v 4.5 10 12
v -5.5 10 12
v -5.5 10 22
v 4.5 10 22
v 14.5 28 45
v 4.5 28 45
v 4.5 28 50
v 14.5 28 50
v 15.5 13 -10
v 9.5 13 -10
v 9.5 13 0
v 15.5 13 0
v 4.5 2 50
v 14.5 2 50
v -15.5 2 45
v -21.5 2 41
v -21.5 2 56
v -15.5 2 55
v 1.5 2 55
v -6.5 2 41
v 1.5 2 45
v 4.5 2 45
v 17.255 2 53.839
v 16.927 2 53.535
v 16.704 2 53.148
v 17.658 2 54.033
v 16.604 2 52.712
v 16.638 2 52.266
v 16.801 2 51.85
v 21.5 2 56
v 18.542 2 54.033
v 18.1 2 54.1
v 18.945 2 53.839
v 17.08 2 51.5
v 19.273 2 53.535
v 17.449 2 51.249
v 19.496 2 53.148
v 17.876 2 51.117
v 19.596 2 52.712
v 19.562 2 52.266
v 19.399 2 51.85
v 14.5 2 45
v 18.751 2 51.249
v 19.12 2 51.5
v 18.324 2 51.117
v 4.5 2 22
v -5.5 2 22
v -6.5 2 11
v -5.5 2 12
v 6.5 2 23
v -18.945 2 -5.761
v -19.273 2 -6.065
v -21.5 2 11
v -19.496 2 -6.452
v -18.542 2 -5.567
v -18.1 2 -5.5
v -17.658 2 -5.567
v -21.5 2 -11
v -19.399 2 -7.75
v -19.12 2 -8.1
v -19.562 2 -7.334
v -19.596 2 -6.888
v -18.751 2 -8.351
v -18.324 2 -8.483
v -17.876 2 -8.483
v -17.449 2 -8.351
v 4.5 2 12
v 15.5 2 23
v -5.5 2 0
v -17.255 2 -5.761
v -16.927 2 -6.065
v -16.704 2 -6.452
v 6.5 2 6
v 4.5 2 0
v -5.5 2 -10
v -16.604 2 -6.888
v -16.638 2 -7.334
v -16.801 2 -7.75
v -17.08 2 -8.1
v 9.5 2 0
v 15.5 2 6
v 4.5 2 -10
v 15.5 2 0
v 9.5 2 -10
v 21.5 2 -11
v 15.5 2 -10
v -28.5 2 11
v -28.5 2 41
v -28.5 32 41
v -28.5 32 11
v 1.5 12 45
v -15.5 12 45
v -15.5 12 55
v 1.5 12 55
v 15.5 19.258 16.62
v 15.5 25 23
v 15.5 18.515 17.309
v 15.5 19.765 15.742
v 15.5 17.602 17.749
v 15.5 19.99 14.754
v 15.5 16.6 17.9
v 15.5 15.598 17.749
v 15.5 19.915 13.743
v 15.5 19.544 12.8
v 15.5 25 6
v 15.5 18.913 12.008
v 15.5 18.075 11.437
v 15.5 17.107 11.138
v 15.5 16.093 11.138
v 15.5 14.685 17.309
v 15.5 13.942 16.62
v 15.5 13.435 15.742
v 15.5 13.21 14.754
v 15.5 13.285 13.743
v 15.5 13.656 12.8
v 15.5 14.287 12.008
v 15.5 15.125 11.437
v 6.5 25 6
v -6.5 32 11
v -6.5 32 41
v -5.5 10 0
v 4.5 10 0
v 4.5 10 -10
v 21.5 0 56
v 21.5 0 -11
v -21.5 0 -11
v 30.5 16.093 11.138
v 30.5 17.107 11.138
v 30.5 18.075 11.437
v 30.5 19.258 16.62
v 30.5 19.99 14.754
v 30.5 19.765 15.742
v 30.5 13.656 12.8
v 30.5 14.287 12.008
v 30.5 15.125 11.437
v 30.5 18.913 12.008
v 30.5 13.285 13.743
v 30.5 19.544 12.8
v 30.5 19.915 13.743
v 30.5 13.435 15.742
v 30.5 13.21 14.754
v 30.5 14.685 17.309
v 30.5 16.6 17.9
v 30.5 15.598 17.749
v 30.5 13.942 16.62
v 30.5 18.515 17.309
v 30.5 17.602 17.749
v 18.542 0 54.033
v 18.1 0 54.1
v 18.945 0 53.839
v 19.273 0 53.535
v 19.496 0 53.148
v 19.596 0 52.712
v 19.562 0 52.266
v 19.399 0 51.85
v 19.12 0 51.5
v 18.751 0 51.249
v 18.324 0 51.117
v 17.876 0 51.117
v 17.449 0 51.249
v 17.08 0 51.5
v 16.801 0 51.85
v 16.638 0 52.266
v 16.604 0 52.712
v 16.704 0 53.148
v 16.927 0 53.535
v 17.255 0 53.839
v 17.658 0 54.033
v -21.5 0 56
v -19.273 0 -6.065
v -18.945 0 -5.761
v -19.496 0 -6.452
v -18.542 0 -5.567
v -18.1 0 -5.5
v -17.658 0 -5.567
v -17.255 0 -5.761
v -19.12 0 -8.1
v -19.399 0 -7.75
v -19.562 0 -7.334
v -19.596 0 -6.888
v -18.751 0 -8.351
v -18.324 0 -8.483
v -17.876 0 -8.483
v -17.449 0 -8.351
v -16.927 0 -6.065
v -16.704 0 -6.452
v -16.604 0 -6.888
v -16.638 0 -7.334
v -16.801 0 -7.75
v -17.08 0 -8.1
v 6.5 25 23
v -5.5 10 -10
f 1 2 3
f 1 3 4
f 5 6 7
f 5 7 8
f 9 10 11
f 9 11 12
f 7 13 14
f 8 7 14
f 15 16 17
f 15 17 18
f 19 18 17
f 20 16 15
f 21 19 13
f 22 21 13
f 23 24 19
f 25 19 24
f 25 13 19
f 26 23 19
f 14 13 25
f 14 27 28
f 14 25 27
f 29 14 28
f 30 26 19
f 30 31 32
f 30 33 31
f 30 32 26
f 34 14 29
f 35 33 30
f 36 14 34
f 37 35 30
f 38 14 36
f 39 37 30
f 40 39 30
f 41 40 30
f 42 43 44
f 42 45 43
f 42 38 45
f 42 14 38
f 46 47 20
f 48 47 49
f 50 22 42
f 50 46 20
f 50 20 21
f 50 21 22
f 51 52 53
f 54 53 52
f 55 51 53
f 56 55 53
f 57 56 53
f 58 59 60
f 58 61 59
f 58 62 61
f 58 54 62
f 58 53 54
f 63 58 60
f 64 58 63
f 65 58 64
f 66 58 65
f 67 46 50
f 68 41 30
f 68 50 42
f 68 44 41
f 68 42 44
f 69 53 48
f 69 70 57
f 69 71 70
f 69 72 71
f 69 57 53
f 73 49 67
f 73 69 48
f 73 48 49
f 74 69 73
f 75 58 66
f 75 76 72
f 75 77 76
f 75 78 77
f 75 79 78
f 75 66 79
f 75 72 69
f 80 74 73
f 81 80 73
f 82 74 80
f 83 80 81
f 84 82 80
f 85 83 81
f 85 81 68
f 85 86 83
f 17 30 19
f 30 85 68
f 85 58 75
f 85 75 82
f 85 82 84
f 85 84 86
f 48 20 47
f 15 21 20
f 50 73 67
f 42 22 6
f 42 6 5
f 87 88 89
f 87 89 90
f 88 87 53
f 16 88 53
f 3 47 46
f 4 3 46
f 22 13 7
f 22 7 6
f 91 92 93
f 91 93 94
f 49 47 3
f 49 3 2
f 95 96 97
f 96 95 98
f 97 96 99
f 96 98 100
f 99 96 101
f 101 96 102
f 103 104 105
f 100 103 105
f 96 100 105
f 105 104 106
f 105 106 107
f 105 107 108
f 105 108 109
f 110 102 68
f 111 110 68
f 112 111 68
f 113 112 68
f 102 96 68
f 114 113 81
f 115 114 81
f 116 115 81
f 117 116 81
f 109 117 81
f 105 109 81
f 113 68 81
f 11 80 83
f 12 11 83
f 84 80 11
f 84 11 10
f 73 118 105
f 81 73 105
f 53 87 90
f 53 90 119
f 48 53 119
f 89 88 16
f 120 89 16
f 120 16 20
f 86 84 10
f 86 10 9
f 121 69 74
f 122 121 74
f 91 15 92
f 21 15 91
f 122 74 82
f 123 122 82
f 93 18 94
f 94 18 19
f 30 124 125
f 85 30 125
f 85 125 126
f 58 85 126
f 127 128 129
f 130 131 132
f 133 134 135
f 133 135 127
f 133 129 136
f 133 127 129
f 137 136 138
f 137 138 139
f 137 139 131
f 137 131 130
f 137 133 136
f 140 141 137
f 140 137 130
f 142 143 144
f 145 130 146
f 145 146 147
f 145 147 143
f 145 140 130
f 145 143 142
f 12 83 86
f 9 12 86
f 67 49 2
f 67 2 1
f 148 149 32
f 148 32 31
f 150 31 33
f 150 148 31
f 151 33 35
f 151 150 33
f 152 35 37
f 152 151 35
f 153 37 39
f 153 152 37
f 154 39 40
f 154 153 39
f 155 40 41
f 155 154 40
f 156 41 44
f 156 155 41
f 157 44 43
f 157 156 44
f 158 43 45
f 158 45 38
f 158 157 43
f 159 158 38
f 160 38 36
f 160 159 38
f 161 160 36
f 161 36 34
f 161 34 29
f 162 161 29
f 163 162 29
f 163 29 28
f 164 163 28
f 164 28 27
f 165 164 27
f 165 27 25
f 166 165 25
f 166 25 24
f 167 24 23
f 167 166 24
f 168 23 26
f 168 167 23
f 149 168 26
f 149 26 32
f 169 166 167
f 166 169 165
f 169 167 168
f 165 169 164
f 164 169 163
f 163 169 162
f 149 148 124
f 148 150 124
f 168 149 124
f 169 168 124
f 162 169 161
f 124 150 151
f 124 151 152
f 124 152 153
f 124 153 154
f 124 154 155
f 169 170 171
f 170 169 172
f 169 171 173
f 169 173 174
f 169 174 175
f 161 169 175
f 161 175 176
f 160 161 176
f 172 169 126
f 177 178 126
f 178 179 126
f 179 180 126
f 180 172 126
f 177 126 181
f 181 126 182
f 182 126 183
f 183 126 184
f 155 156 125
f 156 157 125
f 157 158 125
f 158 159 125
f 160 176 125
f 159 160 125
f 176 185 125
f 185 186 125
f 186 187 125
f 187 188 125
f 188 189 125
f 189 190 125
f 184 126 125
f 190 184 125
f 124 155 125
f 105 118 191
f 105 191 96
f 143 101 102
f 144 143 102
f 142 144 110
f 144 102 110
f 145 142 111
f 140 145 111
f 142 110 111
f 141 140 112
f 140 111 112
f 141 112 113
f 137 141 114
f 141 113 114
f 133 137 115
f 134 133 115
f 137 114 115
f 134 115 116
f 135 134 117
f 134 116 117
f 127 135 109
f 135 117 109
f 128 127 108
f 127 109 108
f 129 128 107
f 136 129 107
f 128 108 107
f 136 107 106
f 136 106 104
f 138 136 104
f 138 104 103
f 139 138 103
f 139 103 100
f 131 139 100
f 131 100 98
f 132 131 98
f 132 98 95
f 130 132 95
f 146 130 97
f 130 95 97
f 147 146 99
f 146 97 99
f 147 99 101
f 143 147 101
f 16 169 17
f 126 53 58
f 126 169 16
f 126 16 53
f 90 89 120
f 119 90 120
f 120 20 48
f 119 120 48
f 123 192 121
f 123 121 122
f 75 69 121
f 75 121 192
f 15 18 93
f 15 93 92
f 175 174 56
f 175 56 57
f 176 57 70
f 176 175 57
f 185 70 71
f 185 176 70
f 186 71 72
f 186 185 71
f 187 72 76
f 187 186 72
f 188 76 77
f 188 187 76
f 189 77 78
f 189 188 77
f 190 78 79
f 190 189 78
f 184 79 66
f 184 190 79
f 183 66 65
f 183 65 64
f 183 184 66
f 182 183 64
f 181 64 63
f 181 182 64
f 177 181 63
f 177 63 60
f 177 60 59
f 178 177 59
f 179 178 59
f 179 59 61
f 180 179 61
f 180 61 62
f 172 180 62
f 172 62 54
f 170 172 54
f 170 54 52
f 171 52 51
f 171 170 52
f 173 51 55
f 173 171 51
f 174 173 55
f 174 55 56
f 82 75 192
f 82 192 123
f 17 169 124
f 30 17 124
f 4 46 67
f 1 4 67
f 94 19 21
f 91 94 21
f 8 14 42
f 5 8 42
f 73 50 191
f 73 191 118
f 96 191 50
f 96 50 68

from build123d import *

# Parameters (mm, degrees)
SKETCH1_W              = 43
SKETCH1_H              = 112
SKETCH1_R              = 1.5
BOARD_DEPTH            = 2
SKETCH2_W              = 16
SKETCH2_H              = 40
SKETCH2_W_2            = 6
SKETCH2_H_2            = 10
F_7SEG_DEPTH           = 11
SKETCH3_W              = 10
SKETCH3_H              = 20
SKETCH3_H_2            = 10
IC_DEPTH               = 8
SKETCH5_W              = 9
SKETCH5_H              = 17
BIENTROA_DEPTH         = 23
SKETCH6_R              = 3.4
BIENTROB_DEPTH         = 15
SKETCH7_W              = 10
SKETCH7_H              = 5
IRF540_DEPTH           = 26
SKETCH8_W              = 17
SKETCH8_H              = 10
DOMINO_DEPTH           = 10
SKETCH9_W              = 22
SKETCH9_H              = 30
EXTRUDE_7805_DEPTH     = 30
SPLIT2_SURFACE_1_BACK  = 131.572
SPLIT2_SURFACE_1_DEPTH = 263.144
SPLIT2_SURFACE_2_BACK  = 131.572
SPLIT2_SURFACE_2_DEPTH = 263.144


with BuildPart() as part:
    # Sketch1 → Board (new body)
    with BuildSketch(Plane(origin=(0, 0, 0), x_dir=(1, 0, 0), z_dir=(0, 1, 0))):
        Rectangle(SKETCH1_W, SKETCH1_H)
        with Locations(Location((18.1, -52.6, 0), (0, 0, 270))):
            Circle(SKETCH1_R, mode=Mode.SUBTRACT)
        with Locations(Location((-16.5, 52, 0), (0, 0, 270))):
            Circle(SKETCH1_R, mode=Mode.SUBTRACT)
        with Locations(Location((-18.1, 7, 0), (0, 0, 270))):
            Circle(SKETCH1_R, mode=Mode.SUBTRACT)
    extrude(amount=BOARD_DEPTH)

    # Sketch2 → 7SEG (add)
    with BuildSketch(Plane(origin=(0, 2, 0), x_dir=(1, 0, 0), z_dir=(0, 1, 0))):
        with Locations((8.5, 31)):
            Rectangle(SKETCH2_W, SKETCH2_H)
        with Locations((12.5, 5)):
            Rectangle(SKETCH2_W_2, SKETCH2_H_2)
    extrude(amount=F_7SEG_DEPTH)

    # Sketch3 → IC (add)
    with BuildSketch(Plane(origin=(0, 2, 0), x_dir=(1, 0, 0), z_dir=(0, 1, 0))):
        with Locations((-6.5, 26)):
            Rectangle(SKETCH3_W, SKETCH3_H)
        with Locations((-0.5, 5)):
            Rectangle(SKETCH3_W, SKETCH3_H_2)
        with Locations((-0.5, -17)):
            Rectangle(SKETCH3_W, SKETCH3_H_2)
    extrude(amount=IC_DEPTH)

    # Sketch5 → BienTroA (add)
    with BuildSketch(Plane(origin=(0, 2, 0), x_dir=(1, 0, 0), z_dir=(0, 1, 0))):
        with Locations((11, -14.5)):
            Rectangle(SKETCH5_W, SKETCH5_H)
    extrude(amount=BIENTROA_DEPTH)

    # Sketch6 → BienTroB (add)
    with BuildSketch(Plane(origin=(15.5, 0, 0), x_dir=(0, 0, -1), z_dir=(1, 0, 0))):
        with Locations(Location((-14.5, 16.6, 0), (0, 0, 180))):
            Circle(SKETCH6_R)
    extrude(amount=BIENTROB_DEPTH)

    # Sketch7 → IRF540 (add)
    with BuildSketch(Plane(origin=(0, 2, 0), x_dir=(1, 0, 0), z_dir=(0, 1, 0))):
        with Locations((9.5, -47.5)):
            Rectangle(SKETCH7_W, SKETCH7_H)
    extrude(amount=IRF540_DEPTH)

    # Sketch8 → Domino (add)
    with BuildSketch(Plane(origin=(0, 2, 0), x_dir=(1, 0, 0), z_dir=(0, 1, 0))):
        with Locations((-7, -50)):
            Rectangle(SKETCH8_W, SKETCH8_H)
    extrude(amount=DOMINO_DEPTH)

    # Sketch9 → 7805 (add)
    with BuildSketch(Plane(origin=(0, 2, 0), x_dir=(1, 0, 0), z_dir=(0, 1, 0))):
        with Locations((-17.5, -26)):
            Rectangle(SKETCH9_W, SKETCH9_H)
    extrude(amount=EXTRUDE_7805_DEPTH)


with BuildPart() as body_2:
    # Split2: the piece behind the surface
    add(part.part)
    # Split2 surface: a surface, the sketch's curves swept straight by 263.144 mm
    with BuildLine(Plane(origin=(0, 2, 0), x_dir=(1, 0, 0), z_dir=(0, 1, 0)).offset(-SPLIT2_SURFACE_1_BACK), mode=Mode.PRIVATE) as split2_surface_1_path:
        Line((21.5, 11), (-21.5, 11))
    split2_surface_1 = Shell.extrude(split2_surface_1_path.wire(), (0 * SPLIT2_SURFACE_1_DEPTH, 1 * SPLIT2_SURFACE_1_DEPTH, 0 * SPLIT2_SURFACE_1_DEPTH))
    split(bisect_by=split2_surface_1, keep=Keep.BOTTOM)


with BuildPart() as part_1:
    add(part.part)

    # Split2: split by a surface, the side it looks to stays
    # Split2 surface: a surface, the sketch's curves swept straight by 263.144 mm
    with BuildLine(Plane(origin=(0, 2, 0), x_dir=(1, 0, 0), z_dir=(0, 1, 0)).offset(-SPLIT2_SURFACE_2_BACK), mode=Mode.PRIVATE) as split2_surface_2_path:
        Line((21.5, 11), (-21.5, 11))
    split2_surface_2 = Shell.extrude(split2_surface_2_path.wire(), (0 * SPLIT2_SURFACE_2_DEPTH, 1 * SPLIT2_SURFACE_2_DEPTH, 0 * SPLIT2_SURFACE_2_DEPTH))
    split(bisect_by=split2_surface_2, keep=Keep.TOP)


solid = part_1.part
